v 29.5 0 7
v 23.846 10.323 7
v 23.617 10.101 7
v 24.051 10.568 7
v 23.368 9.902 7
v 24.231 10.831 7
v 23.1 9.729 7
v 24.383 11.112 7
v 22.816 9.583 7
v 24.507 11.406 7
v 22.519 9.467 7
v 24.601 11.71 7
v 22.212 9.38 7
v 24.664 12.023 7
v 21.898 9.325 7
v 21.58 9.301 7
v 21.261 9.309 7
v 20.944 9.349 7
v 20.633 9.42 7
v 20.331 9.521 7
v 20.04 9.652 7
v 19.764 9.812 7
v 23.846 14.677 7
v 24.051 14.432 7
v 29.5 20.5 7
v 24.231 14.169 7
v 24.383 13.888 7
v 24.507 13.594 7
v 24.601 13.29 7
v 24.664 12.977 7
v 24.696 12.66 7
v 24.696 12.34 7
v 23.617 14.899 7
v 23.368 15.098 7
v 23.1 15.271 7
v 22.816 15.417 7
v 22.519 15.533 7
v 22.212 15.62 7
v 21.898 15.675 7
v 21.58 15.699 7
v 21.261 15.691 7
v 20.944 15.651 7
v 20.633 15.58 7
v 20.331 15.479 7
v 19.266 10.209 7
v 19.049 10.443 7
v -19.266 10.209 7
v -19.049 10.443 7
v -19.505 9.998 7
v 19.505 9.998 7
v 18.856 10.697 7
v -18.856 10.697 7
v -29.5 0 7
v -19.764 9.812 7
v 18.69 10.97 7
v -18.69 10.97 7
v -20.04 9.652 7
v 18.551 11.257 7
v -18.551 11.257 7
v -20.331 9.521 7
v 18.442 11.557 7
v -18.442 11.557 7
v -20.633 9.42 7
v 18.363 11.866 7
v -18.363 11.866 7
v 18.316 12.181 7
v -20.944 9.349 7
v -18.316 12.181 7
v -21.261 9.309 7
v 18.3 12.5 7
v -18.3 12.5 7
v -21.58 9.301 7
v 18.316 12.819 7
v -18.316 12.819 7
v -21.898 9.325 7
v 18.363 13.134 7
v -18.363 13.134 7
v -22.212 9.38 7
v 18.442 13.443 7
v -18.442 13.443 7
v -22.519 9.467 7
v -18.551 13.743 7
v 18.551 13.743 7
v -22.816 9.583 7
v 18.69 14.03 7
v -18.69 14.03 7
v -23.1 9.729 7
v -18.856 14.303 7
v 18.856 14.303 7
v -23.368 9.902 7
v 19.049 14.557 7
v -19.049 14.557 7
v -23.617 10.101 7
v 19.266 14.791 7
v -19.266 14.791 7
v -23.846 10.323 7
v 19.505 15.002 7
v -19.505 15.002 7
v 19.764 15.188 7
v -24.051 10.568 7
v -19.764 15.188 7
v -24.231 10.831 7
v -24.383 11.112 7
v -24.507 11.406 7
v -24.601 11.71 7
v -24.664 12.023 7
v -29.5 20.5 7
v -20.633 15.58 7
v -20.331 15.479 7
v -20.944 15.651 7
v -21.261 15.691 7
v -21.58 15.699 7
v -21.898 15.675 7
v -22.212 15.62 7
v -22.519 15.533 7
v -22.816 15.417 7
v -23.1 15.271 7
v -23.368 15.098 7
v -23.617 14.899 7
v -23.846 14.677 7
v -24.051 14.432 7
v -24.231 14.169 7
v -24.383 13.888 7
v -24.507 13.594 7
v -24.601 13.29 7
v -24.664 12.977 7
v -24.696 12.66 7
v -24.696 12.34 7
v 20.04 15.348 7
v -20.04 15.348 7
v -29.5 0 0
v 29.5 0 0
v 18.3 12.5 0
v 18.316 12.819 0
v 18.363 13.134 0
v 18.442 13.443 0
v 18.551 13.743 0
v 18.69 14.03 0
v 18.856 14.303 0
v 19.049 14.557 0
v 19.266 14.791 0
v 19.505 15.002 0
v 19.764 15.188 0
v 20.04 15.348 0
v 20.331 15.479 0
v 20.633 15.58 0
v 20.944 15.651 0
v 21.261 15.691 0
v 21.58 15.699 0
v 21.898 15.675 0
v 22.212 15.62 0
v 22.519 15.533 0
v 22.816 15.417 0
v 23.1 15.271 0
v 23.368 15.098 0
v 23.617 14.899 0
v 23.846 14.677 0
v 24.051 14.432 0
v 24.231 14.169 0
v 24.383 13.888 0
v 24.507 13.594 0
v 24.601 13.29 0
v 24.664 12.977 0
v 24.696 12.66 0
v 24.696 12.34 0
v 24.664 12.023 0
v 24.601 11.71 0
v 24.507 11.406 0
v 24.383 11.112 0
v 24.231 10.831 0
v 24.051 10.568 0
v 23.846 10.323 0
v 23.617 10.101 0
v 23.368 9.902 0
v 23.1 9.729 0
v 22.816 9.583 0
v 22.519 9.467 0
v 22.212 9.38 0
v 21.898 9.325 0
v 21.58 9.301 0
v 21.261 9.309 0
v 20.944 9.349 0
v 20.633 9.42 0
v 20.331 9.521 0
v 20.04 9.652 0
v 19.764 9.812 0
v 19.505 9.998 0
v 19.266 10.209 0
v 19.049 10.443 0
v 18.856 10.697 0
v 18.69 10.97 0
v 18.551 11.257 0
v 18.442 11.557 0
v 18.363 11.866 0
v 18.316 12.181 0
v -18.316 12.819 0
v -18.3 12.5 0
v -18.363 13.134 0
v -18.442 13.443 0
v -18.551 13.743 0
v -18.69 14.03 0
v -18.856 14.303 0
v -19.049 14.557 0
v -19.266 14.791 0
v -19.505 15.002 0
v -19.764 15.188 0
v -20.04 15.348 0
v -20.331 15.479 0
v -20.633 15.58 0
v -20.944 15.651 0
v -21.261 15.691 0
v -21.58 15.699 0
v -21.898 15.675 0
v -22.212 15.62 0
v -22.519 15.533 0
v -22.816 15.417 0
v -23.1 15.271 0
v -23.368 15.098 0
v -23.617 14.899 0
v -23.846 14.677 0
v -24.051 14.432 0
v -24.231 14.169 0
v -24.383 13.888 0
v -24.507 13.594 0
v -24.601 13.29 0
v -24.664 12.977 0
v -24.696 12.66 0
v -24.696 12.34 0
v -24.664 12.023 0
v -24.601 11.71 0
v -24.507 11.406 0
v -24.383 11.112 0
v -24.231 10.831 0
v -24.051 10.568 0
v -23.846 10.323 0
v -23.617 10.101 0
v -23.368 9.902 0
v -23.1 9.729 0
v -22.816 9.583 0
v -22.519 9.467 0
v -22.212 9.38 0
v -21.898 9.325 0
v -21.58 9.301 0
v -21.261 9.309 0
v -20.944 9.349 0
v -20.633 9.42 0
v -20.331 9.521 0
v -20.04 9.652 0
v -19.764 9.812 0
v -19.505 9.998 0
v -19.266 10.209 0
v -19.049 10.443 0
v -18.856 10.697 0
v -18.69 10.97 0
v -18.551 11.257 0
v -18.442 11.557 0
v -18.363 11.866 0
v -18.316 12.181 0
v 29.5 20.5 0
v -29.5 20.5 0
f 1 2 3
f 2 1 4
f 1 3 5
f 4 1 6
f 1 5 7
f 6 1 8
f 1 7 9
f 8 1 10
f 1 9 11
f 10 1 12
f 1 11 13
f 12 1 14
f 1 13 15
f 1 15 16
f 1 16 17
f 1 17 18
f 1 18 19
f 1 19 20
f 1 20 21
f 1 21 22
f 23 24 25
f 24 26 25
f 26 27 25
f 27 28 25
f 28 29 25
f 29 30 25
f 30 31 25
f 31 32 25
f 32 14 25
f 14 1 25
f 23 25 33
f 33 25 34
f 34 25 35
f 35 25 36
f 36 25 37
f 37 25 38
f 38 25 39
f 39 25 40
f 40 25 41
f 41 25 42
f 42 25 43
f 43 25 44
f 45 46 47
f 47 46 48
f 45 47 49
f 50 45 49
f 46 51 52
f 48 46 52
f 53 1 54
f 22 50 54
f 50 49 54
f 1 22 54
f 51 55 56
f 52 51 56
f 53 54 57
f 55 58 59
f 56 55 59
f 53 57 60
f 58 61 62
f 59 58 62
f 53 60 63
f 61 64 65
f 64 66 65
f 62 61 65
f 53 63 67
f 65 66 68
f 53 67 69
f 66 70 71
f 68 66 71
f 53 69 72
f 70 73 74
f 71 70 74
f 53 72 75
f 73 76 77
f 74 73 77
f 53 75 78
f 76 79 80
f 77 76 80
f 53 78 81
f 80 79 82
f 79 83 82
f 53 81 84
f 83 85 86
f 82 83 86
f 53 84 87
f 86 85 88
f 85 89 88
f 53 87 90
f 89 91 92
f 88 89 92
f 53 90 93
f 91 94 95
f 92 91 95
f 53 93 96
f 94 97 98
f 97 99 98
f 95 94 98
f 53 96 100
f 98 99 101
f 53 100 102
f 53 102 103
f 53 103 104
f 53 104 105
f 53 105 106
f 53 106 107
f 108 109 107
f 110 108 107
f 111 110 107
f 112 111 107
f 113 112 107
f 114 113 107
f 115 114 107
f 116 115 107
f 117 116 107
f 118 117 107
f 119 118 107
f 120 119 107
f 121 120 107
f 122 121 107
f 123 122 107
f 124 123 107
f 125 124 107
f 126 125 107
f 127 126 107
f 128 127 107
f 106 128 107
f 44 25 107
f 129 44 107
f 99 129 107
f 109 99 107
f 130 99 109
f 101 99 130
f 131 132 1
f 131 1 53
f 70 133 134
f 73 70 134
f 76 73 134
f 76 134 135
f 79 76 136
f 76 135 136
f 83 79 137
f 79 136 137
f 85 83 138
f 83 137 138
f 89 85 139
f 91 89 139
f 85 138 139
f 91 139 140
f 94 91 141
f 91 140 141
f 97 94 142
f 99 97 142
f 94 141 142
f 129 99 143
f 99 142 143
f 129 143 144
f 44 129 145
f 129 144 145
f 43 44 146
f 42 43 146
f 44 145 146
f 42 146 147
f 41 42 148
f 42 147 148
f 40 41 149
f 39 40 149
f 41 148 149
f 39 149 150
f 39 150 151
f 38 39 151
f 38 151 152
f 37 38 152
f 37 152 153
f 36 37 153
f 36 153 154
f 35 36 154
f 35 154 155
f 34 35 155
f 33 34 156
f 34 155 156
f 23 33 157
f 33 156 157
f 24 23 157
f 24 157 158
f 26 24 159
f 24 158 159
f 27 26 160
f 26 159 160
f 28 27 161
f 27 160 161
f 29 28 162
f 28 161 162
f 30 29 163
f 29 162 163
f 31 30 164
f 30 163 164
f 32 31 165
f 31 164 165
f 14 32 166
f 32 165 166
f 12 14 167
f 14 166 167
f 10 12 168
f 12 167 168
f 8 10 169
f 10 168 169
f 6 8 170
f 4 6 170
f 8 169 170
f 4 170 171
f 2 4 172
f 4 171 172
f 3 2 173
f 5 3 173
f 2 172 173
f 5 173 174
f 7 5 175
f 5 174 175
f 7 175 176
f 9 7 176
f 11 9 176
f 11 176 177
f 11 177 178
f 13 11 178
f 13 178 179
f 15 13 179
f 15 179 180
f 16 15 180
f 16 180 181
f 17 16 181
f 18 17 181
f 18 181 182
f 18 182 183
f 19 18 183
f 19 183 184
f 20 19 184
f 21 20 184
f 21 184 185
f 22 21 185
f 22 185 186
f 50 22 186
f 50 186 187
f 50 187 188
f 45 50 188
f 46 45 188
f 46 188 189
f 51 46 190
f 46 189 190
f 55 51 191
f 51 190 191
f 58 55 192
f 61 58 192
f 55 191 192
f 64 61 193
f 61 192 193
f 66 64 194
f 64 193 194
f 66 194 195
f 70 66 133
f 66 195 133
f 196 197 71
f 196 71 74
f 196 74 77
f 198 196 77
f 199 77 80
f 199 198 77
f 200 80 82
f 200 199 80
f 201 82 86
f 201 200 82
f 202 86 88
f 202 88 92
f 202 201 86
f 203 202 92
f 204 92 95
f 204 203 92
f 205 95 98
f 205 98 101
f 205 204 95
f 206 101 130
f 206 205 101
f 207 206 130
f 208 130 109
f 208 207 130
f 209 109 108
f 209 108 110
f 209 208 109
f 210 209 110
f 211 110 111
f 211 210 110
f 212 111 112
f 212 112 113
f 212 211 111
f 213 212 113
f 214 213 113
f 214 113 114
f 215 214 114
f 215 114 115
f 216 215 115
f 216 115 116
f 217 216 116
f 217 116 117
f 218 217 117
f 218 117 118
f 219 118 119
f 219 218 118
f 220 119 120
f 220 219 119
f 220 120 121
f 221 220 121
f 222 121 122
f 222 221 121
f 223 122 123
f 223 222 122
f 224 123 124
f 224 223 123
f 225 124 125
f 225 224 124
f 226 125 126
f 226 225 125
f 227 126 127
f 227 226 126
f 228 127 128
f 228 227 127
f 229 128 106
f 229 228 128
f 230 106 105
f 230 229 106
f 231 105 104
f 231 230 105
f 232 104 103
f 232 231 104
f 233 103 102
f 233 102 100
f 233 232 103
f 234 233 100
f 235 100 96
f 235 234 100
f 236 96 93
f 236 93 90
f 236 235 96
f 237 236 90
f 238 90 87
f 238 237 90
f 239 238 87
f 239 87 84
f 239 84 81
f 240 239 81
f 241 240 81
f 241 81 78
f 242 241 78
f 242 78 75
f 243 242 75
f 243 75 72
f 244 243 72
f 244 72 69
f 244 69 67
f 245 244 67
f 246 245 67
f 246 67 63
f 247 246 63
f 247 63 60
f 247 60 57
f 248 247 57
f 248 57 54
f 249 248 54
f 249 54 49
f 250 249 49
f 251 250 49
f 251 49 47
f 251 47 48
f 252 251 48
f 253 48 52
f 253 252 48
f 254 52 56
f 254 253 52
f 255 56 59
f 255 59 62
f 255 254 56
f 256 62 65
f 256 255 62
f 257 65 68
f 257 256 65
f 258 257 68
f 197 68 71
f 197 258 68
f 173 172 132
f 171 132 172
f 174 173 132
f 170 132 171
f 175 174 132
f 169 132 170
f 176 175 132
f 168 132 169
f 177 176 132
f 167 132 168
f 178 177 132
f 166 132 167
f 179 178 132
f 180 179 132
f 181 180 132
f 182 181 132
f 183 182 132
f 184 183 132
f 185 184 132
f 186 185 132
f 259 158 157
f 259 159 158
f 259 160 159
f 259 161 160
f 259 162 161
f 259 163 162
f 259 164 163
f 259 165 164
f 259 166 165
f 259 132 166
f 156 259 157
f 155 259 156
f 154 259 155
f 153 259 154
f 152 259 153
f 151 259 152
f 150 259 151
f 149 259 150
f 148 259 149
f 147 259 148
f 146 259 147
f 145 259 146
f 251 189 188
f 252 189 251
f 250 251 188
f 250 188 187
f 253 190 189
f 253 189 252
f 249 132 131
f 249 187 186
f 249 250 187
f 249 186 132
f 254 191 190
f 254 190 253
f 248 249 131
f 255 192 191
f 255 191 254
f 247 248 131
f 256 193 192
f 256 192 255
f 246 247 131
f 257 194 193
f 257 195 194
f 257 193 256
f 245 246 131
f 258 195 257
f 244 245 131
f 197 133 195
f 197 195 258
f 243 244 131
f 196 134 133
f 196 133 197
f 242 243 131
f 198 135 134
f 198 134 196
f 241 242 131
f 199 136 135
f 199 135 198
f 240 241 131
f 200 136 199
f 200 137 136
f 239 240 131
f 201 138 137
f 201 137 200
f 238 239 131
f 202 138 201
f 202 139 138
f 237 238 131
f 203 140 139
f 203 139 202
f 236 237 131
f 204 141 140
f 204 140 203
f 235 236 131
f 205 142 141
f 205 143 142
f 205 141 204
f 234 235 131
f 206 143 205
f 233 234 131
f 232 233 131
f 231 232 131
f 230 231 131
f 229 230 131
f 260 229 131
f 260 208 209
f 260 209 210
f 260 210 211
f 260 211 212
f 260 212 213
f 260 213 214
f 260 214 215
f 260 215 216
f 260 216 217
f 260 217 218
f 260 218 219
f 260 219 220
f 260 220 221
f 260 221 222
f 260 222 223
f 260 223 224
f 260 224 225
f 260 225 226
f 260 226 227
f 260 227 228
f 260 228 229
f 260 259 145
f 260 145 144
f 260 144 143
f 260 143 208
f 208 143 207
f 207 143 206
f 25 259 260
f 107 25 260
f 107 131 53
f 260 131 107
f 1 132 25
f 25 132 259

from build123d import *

# Parameters (mm, degrees)
SKETCH_W  = 29.5
SKETCH_H  = 20.5
SKETCH_R  = 3.2
PAD_DEPTH = 7


with BuildPart() as part:
    # Sketch → Pad (new body)
    with BuildSketch(Plane.XY):
        with Locations((-14.75, 10.25)):
            Rectangle(SKETCH_W, SKETCH_H)
        with Locations((-21.5, 12.5)):
            Circle(SKETCH_R, mode=Mode.SUBTRACT)
    pad = extrude(amount=PAD_DEPTH)

    # Mirrored: Pad across Sketch V_Axis
    add(pad.mirror(Plane(origin=(0, 0, 0), x_dir=(0, 0, 1), z_dir=(1, 0, 0))))


solid = part.part
